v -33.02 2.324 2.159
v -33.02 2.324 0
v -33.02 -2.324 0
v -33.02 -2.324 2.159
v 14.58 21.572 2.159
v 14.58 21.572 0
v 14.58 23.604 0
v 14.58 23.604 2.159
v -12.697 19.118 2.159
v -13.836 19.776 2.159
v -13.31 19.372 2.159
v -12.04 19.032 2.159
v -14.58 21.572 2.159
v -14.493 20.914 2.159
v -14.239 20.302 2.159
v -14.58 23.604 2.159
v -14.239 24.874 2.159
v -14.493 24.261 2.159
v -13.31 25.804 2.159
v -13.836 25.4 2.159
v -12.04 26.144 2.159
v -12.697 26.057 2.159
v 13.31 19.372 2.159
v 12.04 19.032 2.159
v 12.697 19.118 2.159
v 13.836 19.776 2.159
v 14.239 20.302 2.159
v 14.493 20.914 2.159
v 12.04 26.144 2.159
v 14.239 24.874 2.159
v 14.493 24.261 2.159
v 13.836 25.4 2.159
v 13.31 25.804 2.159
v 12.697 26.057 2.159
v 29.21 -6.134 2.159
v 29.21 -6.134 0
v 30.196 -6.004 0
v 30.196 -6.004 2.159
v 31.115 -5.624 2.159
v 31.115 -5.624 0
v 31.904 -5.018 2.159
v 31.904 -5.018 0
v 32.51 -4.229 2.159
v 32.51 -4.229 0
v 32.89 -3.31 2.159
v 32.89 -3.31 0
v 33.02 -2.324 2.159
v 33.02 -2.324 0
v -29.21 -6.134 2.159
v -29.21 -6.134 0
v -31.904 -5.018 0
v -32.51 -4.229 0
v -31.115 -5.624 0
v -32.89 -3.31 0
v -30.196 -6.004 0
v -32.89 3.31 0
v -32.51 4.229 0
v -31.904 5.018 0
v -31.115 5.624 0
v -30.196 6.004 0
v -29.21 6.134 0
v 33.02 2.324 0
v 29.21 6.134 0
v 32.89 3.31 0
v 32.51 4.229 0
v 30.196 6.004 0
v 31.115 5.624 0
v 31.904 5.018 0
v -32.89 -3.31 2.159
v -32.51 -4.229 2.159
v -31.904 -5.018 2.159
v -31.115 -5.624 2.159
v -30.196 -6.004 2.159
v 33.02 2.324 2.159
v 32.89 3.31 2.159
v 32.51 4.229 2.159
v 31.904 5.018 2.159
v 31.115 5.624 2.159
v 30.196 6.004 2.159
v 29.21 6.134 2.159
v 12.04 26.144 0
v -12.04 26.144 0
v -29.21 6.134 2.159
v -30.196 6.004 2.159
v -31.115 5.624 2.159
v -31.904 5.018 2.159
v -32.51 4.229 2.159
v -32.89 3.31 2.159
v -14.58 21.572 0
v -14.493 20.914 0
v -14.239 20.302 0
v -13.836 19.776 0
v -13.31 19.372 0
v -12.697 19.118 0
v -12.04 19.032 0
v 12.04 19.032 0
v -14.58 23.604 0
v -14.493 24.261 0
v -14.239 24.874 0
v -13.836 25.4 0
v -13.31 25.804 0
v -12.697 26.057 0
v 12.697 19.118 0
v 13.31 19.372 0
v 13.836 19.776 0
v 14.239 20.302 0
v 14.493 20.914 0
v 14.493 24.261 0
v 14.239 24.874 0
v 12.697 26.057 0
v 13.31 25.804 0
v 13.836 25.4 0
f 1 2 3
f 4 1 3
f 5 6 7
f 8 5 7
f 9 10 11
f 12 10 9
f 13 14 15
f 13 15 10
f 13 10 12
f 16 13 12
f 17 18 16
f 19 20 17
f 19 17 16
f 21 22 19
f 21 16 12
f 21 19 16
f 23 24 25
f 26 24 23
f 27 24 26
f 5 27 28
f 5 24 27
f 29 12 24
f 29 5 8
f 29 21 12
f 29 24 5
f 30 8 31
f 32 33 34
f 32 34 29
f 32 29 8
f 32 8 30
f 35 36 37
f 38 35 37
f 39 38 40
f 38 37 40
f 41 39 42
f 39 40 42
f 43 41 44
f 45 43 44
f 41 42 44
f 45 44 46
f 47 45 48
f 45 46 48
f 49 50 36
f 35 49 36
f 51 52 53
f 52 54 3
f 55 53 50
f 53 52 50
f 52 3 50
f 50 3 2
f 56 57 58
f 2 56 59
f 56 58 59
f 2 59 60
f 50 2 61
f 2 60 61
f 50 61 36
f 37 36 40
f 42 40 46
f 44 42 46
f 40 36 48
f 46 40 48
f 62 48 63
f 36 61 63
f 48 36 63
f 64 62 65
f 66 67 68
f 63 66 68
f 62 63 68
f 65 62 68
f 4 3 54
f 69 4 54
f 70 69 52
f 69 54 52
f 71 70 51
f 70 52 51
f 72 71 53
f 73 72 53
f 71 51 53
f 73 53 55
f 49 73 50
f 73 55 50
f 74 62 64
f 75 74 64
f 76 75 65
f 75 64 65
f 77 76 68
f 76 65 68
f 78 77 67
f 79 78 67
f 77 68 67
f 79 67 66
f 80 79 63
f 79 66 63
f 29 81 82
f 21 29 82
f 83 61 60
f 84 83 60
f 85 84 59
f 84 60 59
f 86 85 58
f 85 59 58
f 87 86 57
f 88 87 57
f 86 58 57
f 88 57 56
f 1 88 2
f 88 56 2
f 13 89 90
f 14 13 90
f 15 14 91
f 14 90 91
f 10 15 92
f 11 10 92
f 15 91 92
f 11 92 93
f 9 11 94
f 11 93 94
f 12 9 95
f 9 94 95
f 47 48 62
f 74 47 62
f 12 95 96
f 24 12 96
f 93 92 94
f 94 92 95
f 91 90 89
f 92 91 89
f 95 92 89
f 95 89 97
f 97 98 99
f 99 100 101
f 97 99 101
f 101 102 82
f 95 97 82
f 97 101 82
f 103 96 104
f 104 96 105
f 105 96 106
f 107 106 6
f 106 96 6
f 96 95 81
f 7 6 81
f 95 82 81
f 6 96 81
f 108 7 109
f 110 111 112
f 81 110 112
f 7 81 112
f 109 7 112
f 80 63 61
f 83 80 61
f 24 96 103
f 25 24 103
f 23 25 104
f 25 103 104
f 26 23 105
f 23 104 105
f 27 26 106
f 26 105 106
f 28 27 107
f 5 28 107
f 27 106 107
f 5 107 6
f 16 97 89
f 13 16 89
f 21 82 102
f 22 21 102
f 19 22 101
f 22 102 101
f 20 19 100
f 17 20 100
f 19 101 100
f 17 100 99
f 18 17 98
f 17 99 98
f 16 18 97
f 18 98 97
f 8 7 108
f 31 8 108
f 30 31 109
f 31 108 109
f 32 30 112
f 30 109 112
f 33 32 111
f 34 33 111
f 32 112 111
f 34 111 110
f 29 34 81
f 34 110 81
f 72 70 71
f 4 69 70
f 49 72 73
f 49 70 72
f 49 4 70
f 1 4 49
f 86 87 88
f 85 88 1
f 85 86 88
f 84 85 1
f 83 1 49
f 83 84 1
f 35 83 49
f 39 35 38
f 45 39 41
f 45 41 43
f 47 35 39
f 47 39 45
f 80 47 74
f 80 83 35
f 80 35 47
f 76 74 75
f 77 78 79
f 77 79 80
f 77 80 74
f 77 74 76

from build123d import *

# Parameters (mm, degrees)
F1_DEPTH = 2.159


with BuildPart() as f1:
    # F0 (on Top) → F1 (new body)
    with BuildSketch(Plane.XY):
        with BuildLine():
            Line((-12.0396, 19.031858), (12.0396, 19.031858))
            ThreePointArc((12.0396, 19.031858), (13.835651, 19.775807), (14.5796, 21.571858))
            Line((14.5796, 21.571858), (14.5796, 23.603858))
            ThreePointArc((14.5796, 23.603858), (13.835651, 25.399909), (12.0396, 26.143858))
            Line((12.0396, 26.143858), (-12.0396, 26.143858))
            ThreePointArc((-12.0396, 26.143858), (-13.835651, 25.399909), (-14.5796, 23.603858))
            Line((-14.5796, 23.603858), (-14.5796, 21.571858))
            ThreePointArc((-14.5796, 21.571858), (-13.835651, 19.775807), (-12.0396, 19.031858))
        make_face()
        with BuildLine():
            Line((-29.21, -6.1341), (29.21, -6.1341))
            ThreePointArc((29.21, -6.1341), (31.904077, -5.018177), (33.02, -2.3241))
            Line((33.02, -2.3241), (33.02, 2.3241))
            ThreePointArc((33.02, 2.3241), (31.904077, 5.018177), (29.21, 6.1341))
            Line((29.21, 6.1341), (-29.21, 6.1341))
            ThreePointArc((-29.21, 6.1341), (-31.904077, 5.018177), (-33.02, 2.3241))
            Line((-33.02, 2.3241), (-33.02, -2.3241))
            ThreePointArc((-33.02, -2.3241), (-31.904077, -5.018177), (-29.21, -6.1341))
        make_face()
    extrude(amount=F1_DEPTH)


solid = f1.part
